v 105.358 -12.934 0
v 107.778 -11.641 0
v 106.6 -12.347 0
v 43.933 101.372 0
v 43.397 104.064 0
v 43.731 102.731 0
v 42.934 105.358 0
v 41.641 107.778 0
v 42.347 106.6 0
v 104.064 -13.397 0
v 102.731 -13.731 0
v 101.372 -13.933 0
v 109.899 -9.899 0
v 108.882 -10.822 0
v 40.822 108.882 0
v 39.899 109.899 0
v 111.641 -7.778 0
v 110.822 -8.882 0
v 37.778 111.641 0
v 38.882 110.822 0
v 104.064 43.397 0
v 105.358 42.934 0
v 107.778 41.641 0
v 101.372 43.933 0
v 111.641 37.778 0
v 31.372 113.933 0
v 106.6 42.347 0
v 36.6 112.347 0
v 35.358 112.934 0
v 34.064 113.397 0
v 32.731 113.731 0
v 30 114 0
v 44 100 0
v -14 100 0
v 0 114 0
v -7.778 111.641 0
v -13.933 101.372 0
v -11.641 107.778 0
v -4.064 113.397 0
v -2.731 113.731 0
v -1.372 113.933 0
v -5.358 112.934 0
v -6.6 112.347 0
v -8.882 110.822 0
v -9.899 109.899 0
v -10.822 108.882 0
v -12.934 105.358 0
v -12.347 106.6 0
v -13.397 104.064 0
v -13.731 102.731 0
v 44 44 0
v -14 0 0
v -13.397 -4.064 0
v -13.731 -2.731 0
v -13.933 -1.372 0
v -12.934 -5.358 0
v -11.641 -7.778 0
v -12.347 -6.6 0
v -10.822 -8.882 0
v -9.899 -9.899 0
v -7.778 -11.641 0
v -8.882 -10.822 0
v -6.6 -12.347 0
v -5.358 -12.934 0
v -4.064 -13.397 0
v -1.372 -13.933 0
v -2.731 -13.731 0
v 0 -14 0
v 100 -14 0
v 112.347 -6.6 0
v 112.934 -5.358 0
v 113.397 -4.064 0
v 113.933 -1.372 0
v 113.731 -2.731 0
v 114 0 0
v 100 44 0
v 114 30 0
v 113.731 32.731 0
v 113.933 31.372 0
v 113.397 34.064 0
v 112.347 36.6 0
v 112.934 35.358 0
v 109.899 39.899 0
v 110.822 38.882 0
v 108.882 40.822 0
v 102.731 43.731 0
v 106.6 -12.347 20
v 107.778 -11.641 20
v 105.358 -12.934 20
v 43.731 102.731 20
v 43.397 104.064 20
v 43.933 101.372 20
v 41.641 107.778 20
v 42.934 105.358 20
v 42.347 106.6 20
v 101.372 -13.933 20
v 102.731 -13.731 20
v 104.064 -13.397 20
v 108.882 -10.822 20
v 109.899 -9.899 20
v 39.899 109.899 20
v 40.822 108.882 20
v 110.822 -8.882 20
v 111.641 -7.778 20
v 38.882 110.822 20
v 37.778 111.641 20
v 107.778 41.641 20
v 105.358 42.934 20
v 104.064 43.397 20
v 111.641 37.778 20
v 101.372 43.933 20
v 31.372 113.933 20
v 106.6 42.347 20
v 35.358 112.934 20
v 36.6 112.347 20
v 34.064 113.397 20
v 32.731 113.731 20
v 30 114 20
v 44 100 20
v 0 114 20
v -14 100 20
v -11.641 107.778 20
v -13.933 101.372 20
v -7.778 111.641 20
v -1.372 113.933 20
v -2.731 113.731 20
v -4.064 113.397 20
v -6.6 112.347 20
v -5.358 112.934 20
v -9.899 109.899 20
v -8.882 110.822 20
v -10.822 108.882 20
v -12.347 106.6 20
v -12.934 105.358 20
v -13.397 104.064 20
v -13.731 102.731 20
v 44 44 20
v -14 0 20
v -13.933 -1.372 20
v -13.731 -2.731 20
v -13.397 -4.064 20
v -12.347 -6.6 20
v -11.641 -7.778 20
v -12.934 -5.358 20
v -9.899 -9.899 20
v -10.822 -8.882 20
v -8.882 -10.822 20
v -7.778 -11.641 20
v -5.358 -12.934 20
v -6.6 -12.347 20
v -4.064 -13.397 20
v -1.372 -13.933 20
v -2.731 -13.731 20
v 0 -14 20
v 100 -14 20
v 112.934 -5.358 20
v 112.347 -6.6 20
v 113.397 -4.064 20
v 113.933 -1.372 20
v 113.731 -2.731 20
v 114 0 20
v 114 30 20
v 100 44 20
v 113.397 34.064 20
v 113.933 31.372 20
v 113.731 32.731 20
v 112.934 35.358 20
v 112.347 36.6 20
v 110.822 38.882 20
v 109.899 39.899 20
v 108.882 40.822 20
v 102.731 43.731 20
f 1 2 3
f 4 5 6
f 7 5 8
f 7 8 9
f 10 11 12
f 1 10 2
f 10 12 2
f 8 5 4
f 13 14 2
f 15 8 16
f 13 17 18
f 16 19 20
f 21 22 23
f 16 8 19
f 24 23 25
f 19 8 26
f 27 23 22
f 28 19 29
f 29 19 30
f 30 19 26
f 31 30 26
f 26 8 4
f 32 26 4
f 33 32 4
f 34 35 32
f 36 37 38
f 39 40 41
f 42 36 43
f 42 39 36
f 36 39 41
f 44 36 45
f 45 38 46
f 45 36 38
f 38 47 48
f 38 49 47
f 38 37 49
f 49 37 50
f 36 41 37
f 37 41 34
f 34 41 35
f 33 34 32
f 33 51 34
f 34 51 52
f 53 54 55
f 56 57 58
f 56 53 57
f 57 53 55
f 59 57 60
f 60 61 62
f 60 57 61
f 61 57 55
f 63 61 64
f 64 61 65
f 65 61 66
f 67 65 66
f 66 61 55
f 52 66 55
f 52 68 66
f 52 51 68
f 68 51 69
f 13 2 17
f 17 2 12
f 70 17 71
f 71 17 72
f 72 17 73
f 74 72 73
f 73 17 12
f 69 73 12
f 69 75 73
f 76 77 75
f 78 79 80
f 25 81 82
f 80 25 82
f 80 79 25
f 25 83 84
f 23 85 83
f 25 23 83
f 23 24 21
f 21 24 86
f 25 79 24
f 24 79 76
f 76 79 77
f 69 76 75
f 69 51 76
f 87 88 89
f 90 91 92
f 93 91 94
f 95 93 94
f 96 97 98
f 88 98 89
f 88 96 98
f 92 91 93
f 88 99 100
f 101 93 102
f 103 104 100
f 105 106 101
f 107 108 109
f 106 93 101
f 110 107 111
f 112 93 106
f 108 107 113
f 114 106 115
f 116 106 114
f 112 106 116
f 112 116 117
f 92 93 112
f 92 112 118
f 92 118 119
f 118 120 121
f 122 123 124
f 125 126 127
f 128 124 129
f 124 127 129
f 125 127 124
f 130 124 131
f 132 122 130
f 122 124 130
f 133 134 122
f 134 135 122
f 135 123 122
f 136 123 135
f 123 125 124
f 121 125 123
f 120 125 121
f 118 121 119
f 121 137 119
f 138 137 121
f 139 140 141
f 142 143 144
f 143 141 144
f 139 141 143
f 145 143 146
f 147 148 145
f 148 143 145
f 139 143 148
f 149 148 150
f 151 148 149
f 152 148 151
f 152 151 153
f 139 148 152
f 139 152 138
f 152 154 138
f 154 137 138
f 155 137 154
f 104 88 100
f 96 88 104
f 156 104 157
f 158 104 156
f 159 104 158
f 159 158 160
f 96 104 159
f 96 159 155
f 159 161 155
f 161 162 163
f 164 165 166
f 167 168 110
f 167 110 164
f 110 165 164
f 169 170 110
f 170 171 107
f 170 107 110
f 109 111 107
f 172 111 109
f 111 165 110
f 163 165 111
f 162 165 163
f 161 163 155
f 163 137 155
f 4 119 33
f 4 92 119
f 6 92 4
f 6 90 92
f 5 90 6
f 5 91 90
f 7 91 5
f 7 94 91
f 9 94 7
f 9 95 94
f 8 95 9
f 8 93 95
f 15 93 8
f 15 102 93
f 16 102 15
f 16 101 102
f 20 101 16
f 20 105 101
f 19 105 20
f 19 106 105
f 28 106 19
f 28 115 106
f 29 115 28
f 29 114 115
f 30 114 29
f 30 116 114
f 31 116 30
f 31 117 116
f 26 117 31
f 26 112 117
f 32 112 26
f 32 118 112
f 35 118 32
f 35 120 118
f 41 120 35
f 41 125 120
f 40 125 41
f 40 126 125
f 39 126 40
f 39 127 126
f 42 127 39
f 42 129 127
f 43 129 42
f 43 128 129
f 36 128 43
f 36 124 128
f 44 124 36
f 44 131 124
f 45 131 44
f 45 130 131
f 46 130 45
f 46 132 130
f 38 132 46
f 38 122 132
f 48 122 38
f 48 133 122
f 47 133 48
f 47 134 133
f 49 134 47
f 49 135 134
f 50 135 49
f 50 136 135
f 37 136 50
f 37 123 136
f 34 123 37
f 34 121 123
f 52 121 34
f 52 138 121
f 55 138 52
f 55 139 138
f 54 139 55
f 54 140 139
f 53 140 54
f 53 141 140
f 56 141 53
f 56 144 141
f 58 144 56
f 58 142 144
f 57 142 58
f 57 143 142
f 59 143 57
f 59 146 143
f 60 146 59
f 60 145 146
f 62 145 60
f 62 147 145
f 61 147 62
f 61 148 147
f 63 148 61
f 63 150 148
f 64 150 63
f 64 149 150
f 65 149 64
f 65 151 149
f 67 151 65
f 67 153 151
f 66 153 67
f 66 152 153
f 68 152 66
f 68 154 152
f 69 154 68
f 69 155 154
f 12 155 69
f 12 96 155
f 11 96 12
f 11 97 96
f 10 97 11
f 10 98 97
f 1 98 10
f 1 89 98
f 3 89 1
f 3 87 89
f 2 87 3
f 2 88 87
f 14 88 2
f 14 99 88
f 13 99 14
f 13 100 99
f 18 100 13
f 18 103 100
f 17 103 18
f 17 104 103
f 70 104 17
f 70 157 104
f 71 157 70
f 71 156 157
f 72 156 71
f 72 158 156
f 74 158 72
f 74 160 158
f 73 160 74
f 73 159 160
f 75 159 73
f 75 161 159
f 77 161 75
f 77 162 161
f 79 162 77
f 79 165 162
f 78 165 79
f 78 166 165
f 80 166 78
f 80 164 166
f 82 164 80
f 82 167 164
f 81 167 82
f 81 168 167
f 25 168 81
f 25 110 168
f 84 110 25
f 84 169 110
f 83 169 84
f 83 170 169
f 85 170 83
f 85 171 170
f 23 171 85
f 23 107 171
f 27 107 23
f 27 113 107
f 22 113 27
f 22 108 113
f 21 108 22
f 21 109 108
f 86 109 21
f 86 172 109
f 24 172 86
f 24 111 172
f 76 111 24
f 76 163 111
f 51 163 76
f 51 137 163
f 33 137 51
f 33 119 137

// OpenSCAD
// Parameters (adjust as needed)
arm_width = 30;        // Width of the arms
short_length = 100;     // Length of the short arm
long_length = 100;     // Length of the long arm
height = 20;           // Thickness in Z
rounding_radius = 14;   // Radius for rounding the joint (inside and outside)

// 2D L-shaped profile
module l_profile() {
    union() {
        square([short_length, arm_width]);
        square([arm_width, long_length]);
    }
}

// Extrude the Minkowski sum of the profile and a circle for rounding
linear_extrude(height = height) {
    minkowski() {
        l_profile();
        circle(r = rounding_radius, $fn = 64);  // Higher $fn for smoother curves
    }
}
